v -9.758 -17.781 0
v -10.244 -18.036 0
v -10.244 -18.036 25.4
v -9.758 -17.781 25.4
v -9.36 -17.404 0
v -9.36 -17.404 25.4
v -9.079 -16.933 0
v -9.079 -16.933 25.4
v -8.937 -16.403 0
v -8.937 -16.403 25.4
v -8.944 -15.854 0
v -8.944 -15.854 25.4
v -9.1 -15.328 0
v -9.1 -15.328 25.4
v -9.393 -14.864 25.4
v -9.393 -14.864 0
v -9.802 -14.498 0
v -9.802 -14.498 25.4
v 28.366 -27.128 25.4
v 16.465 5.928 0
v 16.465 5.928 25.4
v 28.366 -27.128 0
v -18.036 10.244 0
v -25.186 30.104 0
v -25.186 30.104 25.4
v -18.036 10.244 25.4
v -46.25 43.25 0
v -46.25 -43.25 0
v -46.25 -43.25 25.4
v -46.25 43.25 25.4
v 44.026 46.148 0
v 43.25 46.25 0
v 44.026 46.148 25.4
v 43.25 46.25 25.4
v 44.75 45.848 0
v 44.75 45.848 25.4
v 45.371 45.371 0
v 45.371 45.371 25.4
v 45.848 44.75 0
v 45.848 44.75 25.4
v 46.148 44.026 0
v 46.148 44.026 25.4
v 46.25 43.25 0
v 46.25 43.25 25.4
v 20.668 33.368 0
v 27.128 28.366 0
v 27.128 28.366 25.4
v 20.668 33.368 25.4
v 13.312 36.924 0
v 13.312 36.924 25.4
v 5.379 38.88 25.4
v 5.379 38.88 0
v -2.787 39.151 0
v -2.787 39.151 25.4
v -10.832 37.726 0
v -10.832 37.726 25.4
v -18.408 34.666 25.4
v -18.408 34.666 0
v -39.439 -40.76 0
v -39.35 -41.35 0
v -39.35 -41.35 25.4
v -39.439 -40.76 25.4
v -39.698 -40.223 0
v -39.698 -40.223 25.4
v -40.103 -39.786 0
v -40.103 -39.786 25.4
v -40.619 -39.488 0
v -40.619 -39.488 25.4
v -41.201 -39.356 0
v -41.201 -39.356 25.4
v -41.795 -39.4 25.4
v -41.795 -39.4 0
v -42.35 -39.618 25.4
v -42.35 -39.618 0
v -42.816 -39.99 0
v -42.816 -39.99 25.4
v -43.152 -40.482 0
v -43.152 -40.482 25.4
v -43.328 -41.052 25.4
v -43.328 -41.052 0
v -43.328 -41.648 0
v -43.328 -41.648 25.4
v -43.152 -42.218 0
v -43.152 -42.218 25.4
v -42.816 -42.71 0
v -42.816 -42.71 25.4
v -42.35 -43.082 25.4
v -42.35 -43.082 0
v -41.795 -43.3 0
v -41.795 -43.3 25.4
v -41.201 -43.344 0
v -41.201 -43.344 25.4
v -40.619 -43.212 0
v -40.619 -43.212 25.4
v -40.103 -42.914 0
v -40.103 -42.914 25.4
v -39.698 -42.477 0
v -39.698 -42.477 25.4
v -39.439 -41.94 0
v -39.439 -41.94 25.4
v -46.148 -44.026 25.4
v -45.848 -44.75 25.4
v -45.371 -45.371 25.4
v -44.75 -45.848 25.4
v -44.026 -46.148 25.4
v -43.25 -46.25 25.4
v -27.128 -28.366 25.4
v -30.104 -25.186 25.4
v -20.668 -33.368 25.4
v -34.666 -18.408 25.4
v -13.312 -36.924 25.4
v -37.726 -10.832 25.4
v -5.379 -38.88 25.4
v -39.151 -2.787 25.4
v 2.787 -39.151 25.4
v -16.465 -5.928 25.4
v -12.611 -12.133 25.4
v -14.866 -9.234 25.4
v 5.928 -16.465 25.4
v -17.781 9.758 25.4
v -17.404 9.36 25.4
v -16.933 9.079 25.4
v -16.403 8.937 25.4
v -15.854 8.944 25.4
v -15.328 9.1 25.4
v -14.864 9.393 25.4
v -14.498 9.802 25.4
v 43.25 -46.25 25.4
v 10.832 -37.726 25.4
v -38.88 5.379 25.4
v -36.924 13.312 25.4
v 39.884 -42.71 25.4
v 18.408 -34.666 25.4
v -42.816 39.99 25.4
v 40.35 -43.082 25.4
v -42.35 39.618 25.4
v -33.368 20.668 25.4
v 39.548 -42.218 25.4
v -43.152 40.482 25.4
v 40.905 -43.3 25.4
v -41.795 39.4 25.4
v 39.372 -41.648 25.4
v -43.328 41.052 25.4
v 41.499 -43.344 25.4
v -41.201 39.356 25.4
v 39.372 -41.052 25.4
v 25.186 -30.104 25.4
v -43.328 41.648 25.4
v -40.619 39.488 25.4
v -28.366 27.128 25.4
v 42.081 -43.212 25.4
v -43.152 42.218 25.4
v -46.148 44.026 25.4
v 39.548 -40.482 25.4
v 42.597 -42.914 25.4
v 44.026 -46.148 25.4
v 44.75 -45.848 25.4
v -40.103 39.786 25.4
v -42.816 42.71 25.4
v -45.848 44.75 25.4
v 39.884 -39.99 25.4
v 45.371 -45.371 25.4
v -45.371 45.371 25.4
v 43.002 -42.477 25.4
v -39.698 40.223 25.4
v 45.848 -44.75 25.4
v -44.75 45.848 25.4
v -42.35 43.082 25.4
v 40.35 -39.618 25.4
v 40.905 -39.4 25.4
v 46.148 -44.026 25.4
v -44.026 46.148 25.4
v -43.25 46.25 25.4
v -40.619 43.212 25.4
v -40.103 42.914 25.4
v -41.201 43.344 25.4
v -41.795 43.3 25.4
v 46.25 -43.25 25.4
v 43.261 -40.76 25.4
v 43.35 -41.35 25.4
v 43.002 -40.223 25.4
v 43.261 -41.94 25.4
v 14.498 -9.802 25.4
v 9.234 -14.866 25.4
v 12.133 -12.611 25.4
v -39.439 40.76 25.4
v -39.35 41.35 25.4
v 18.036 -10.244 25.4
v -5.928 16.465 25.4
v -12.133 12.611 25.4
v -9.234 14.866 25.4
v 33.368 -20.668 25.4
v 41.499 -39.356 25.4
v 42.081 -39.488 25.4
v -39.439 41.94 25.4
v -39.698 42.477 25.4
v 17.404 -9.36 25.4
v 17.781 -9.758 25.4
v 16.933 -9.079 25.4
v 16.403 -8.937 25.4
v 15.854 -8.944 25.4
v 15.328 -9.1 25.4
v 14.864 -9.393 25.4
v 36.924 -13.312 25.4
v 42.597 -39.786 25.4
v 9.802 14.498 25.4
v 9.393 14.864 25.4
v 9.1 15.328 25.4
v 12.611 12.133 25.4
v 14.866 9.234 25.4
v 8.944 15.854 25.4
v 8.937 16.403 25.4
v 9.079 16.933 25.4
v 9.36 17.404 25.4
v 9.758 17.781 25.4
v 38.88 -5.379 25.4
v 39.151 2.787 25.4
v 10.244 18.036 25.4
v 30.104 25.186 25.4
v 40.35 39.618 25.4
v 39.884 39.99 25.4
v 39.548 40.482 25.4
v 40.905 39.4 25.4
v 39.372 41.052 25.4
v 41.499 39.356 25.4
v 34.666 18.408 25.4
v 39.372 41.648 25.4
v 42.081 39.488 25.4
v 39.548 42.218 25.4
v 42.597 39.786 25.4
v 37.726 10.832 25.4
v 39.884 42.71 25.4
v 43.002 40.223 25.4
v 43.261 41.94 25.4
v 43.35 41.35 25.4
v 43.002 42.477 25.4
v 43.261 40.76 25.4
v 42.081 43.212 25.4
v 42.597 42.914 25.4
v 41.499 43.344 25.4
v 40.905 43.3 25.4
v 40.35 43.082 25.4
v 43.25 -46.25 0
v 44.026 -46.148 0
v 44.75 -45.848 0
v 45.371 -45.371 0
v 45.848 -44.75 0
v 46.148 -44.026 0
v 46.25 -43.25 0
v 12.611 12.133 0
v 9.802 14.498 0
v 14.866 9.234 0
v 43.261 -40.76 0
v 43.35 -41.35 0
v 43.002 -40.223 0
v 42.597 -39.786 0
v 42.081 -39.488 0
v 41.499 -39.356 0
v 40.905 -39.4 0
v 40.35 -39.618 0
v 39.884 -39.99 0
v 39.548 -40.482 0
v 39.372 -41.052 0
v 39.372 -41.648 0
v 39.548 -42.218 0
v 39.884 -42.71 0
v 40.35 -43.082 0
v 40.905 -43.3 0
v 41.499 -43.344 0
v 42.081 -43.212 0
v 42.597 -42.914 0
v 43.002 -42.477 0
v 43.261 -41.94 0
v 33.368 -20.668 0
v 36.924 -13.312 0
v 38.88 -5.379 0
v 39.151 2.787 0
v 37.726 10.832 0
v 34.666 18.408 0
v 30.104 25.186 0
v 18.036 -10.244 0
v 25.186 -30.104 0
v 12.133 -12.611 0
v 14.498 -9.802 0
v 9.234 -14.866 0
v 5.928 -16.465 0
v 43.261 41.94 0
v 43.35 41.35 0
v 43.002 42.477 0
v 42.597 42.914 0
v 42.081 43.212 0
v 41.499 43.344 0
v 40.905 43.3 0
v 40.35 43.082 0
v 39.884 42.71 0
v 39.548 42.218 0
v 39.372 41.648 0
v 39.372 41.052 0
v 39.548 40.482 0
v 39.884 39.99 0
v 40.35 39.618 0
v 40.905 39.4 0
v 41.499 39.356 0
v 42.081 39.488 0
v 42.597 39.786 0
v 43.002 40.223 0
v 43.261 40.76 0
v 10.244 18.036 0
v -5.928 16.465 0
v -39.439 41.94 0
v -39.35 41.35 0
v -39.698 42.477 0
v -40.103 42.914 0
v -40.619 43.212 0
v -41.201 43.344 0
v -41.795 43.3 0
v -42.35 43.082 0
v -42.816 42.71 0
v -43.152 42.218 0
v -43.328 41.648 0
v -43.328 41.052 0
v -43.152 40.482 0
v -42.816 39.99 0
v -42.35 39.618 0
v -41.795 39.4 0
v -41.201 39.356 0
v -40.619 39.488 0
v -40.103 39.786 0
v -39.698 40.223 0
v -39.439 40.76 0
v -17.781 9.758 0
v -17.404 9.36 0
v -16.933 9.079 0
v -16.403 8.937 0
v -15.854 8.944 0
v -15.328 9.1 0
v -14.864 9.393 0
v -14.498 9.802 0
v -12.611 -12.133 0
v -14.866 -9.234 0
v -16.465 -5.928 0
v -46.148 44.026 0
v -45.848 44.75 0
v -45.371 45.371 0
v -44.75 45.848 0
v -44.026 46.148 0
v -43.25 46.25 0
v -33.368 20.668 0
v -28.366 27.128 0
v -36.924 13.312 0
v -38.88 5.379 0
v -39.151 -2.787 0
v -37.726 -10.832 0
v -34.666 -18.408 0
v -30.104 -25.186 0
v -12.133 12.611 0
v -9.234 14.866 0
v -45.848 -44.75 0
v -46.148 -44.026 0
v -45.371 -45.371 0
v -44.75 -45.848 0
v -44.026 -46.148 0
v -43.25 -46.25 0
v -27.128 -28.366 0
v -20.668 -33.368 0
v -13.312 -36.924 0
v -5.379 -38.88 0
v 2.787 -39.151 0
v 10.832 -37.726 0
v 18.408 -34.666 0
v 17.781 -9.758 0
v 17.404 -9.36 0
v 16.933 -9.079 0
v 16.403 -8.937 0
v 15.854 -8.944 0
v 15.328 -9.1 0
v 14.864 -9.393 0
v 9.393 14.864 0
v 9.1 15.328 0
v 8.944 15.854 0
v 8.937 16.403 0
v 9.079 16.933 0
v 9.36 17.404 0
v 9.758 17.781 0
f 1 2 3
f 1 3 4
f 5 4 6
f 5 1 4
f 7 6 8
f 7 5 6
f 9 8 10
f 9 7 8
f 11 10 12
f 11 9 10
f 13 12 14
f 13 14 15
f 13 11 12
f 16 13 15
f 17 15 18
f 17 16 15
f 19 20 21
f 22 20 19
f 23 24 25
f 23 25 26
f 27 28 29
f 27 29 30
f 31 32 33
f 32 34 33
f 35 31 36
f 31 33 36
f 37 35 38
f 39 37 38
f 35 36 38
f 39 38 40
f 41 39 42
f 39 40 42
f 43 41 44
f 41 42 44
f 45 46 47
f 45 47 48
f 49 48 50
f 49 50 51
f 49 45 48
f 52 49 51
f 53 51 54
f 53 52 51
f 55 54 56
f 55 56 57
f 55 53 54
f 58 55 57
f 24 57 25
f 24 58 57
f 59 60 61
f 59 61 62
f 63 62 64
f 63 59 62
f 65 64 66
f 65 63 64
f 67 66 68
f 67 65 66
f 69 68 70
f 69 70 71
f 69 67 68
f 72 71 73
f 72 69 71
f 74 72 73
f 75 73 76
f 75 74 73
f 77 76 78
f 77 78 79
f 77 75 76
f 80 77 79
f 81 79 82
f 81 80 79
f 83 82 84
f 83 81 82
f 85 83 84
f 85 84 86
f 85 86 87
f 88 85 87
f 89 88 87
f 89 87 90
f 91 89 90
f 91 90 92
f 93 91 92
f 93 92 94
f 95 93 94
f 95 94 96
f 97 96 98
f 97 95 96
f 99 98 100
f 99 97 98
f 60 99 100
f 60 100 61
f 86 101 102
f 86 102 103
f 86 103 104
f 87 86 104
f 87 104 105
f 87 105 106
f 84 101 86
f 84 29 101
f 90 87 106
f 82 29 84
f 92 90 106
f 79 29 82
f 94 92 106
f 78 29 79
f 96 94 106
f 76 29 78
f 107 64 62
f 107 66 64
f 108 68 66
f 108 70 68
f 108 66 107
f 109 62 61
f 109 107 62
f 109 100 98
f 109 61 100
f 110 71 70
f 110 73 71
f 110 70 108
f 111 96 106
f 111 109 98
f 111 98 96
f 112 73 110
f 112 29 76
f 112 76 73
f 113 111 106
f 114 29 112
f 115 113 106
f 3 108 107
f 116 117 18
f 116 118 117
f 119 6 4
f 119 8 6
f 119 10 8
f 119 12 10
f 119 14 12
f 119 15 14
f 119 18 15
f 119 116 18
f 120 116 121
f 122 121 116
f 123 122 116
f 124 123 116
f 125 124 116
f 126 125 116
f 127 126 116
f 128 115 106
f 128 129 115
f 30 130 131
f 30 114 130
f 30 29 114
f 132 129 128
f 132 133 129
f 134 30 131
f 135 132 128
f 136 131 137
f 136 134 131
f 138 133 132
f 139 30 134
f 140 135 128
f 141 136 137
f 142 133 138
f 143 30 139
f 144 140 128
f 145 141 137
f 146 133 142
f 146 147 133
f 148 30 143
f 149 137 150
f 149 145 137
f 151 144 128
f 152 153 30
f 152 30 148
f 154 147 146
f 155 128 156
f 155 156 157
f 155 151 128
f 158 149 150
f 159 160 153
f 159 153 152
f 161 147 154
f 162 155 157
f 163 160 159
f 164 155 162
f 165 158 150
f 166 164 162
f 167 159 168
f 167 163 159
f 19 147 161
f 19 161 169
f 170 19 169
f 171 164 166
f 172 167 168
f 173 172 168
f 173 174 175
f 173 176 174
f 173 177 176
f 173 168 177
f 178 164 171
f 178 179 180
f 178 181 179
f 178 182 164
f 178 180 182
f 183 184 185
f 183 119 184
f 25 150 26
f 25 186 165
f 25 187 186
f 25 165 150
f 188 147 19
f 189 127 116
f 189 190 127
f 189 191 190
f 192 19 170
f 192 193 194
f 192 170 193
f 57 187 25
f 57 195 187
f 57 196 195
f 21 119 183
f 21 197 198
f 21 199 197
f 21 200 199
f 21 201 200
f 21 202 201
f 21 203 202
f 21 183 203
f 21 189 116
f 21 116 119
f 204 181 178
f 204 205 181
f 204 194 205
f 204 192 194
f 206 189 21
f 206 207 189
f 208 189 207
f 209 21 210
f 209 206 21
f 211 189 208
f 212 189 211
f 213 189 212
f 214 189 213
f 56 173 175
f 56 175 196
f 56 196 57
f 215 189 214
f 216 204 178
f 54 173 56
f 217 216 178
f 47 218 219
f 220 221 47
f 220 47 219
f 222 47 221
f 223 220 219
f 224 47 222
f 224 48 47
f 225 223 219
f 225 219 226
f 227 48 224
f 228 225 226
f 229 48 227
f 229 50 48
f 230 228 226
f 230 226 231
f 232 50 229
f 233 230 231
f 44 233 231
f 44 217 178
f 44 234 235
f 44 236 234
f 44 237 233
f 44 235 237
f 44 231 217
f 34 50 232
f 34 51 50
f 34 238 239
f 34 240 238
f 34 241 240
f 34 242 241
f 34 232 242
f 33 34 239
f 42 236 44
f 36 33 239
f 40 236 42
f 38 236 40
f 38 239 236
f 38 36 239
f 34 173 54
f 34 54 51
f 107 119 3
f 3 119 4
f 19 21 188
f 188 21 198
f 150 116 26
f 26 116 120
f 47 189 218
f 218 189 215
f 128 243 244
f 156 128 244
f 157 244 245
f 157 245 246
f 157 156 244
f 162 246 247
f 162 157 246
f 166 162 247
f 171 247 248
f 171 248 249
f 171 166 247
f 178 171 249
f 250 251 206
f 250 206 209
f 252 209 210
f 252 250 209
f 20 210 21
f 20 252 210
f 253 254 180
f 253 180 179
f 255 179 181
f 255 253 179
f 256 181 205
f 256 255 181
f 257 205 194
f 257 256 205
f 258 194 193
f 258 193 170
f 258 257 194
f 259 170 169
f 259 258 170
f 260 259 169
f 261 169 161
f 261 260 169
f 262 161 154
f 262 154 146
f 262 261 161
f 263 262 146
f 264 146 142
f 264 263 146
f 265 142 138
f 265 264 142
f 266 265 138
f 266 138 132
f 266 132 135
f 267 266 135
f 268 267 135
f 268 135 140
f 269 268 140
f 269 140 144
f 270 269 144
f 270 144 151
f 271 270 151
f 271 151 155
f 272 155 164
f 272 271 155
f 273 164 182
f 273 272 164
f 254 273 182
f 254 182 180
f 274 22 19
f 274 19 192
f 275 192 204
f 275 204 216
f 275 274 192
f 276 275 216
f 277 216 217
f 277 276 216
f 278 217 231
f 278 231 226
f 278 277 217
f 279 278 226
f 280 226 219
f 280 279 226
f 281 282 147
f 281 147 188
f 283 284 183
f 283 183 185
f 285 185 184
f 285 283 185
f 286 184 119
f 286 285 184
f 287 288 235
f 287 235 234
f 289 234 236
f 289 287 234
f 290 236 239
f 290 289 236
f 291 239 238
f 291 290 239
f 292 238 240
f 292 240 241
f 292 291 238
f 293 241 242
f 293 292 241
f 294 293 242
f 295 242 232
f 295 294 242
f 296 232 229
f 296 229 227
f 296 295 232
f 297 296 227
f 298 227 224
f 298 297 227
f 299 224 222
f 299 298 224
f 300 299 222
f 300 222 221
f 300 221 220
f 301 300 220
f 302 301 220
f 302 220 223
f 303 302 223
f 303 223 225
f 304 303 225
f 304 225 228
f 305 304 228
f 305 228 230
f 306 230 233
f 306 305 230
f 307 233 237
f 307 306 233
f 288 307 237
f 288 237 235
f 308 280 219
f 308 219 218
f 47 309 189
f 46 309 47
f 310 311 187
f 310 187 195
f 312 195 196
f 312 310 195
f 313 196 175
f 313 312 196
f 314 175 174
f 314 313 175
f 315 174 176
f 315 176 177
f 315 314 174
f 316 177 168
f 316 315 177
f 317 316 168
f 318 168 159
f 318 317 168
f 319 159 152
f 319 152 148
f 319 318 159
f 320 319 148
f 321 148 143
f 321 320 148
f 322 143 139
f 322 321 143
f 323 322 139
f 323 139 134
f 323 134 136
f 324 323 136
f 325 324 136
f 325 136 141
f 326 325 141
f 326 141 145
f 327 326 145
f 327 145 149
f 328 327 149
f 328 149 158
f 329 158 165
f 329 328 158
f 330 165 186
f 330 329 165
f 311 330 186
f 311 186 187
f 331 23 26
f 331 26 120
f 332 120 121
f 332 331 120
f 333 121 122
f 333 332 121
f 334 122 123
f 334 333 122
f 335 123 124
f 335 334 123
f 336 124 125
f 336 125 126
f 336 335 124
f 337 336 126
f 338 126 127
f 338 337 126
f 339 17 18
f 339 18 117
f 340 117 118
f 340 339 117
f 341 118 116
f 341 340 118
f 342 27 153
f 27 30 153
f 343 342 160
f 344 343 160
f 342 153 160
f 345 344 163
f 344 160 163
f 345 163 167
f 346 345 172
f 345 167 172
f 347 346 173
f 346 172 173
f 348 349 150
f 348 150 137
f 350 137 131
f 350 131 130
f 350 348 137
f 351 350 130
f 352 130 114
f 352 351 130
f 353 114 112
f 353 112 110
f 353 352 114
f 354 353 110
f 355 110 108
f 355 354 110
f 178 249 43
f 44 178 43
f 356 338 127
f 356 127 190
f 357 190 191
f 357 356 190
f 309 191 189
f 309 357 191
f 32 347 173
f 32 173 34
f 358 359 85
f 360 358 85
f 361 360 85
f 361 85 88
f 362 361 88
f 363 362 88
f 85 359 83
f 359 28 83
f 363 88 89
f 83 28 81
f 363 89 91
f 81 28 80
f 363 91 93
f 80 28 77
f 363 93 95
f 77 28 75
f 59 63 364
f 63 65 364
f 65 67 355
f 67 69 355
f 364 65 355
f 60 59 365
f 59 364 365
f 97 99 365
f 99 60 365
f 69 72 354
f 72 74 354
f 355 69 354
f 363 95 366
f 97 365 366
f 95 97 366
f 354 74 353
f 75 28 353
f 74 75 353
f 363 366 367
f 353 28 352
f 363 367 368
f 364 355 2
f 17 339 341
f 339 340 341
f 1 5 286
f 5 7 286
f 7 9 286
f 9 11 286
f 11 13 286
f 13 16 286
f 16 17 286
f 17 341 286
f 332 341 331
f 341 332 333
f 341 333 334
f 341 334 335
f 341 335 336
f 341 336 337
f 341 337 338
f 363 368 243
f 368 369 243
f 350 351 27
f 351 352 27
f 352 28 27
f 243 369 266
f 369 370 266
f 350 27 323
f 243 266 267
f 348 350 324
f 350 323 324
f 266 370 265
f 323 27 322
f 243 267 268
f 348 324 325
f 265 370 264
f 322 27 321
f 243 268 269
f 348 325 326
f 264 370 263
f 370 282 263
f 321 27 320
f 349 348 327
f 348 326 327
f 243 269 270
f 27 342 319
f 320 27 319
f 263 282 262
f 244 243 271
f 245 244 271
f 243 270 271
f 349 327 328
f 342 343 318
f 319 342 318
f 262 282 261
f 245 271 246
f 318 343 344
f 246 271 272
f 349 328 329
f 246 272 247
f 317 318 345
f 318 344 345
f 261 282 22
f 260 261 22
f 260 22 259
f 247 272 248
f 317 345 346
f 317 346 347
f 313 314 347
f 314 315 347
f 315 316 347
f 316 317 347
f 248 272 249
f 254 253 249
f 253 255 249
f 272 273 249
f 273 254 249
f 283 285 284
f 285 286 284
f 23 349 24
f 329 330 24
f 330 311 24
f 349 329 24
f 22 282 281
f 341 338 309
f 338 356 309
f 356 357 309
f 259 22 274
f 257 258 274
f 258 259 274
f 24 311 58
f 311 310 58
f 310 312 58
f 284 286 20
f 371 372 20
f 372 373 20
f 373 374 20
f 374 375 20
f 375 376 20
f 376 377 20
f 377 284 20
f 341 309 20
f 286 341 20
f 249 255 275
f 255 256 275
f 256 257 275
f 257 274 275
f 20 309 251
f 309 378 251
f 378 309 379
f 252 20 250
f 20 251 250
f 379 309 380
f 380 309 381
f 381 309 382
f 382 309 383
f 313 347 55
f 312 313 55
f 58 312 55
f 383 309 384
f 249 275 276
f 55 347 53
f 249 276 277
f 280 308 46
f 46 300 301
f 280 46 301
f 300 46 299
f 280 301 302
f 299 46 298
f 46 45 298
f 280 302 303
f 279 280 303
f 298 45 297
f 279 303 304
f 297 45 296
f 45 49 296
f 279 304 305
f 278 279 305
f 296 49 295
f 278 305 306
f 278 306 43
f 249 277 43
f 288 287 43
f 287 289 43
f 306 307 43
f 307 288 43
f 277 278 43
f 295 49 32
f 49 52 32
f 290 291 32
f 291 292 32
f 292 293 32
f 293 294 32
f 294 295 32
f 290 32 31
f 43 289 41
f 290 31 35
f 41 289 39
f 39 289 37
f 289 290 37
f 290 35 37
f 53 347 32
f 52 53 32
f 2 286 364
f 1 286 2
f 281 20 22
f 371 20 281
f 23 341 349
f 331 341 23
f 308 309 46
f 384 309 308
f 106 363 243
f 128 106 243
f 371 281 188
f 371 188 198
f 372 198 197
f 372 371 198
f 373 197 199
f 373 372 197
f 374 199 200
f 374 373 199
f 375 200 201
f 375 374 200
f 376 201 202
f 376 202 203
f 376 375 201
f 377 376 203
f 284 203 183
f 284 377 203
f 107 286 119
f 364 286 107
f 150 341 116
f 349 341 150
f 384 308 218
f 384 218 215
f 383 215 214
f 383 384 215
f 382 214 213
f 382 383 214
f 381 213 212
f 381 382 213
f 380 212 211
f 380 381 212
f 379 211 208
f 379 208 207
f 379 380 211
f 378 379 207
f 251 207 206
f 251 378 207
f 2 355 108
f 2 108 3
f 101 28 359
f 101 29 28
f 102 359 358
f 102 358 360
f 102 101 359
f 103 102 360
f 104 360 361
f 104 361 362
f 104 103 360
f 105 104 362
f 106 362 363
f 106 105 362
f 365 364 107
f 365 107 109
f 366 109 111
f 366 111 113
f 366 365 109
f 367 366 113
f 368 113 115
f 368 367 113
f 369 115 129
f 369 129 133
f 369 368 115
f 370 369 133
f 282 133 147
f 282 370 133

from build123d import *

# Parameters (mm, degrees)
SKETCH_1_W      = 92.5
SKETCH_1_H      = 92.5
SKETCH_1_R      = 2
EXTRUDE_1_DEPTH = 25.4
FILLET_2_R      = 3


with BuildPart() as part:
    # Эскиз1 → Бобышка-Вытянуть1 (new body)
    with BuildSketch(Plane.XY):
        Rectangle(SKETCH_1_W, SKETCH_1_H)
        with Locations((-41.35, 41.35)):
            Circle(SKETCH_1_R, mode=Mode.SUBTRACT)
        with Locations((-41.35, -41.35)):
            Circle(SKETCH_1_R, mode=Mode.SUBTRACT)
        with Locations((41.35, -41.35)):
            Circle(SKETCH_1_R, mode=Mode.SUBTRACT)
        with Locations((41.35, 41.35)):
            Circle(SKETCH_1_R, mode=Mode.SUBTRACT)
        with BuildLine():
            Line((30.103737124, 25.18585935), (10.244232434, 18.036233028))
            ThreePointArc((10.244232434, 18.036233028), (8.93715954, 16.402747815), (9.801515353, 14.497596242))
            ThreePointArc((9.801515353, 14.497596242), (13.81482208, 10.742471359), (16.465475636, 5.92774089))
            Line((16.465475636, 5.92774089), (28.365935027, -27.128144611))
            ThreePointArc((28.365935027, -27.128144611), (39.228362099, -1.303114362), (30.103737124, 25.18585935))
        make_face(mode=Mode.SUBTRACT)
        with BuildLine():
            Line((5.92774089, -16.465475636), (-27.128144611, -28.365935027))
            ThreePointArc((-27.128144611, -28.365935027), (-1.303114362, -39.228362099), (25.18585935, -30.103737124))
            Line((25.18585935, -30.103737124), (18.036233028, -10.244232434))
            ThreePointArc((18.036233028, -10.244232434), (16.402747815, -8.93715954), (14.497596242, -9.801515353))
            ThreePointArc((14.497596242, -9.801515353), (10.742471359, -13.81482208), (5.92774089, -16.465475636))
        make_face(mode=Mode.SUBTRACT)
        with BuildLine():
            Line((-16.465475636, -5.92774089), (-28.365935027, 27.128144611))
            ThreePointArc((-28.365935027, 27.128144611), (-39.228362099, 1.303114362), (-30.103737124, -25.18585935))
            Line((-30.103737124, -25.18585935), (-10.244232434, -18.036233028))
            ThreePointArc((-10.244232434, -18.036233028), (-8.93715954, -16.402747815), (-9.801515353, -14.497596242))
            ThreePointArc((-9.801515353, -14.497596242), (-13.81482208, -10.742471359), (-16.465475636, -5.92774089))
        make_face(mode=Mode.SUBTRACT)
        with BuildLine():
            Line((-5.92774089, 16.465475636), (27.128144611, 28.365935027))
            ThreePointArc((27.128144611, 28.365935027), (1.303114362, 39.228362099), (-25.18585935, 30.103737124))
            Line((-25.18585935, 30.103737124), (-18.036233028, 10.244232434))
            ThreePointArc((-18.036233028, 10.244232434), (-16.402747815, 8.93715954), (-14.497596242, 9.801515353))
            ThreePointArc((-14.497596242, 9.801515353), (-10.742471359, 13.81482208), (-5.92774089, 16.465475636))
        make_face(mode=Mode.SUBTRACT)
    extrude(amount=EXTRUDE_1_DEPTH)

    # Скругление2
    fillet_2_edges = [part.edges().sort_by_distance(p)[0] for p in [
        (-46.25, 46.25, 12.7),
        (46.25, 46.25, 12.7),
        (46.25, -46.25, 12.7),
        (-46.25, -46.25, 12.7),
    ]]
    fillet(fillet_2_edges, radius=FILLET_2_R)


solid = part.part
